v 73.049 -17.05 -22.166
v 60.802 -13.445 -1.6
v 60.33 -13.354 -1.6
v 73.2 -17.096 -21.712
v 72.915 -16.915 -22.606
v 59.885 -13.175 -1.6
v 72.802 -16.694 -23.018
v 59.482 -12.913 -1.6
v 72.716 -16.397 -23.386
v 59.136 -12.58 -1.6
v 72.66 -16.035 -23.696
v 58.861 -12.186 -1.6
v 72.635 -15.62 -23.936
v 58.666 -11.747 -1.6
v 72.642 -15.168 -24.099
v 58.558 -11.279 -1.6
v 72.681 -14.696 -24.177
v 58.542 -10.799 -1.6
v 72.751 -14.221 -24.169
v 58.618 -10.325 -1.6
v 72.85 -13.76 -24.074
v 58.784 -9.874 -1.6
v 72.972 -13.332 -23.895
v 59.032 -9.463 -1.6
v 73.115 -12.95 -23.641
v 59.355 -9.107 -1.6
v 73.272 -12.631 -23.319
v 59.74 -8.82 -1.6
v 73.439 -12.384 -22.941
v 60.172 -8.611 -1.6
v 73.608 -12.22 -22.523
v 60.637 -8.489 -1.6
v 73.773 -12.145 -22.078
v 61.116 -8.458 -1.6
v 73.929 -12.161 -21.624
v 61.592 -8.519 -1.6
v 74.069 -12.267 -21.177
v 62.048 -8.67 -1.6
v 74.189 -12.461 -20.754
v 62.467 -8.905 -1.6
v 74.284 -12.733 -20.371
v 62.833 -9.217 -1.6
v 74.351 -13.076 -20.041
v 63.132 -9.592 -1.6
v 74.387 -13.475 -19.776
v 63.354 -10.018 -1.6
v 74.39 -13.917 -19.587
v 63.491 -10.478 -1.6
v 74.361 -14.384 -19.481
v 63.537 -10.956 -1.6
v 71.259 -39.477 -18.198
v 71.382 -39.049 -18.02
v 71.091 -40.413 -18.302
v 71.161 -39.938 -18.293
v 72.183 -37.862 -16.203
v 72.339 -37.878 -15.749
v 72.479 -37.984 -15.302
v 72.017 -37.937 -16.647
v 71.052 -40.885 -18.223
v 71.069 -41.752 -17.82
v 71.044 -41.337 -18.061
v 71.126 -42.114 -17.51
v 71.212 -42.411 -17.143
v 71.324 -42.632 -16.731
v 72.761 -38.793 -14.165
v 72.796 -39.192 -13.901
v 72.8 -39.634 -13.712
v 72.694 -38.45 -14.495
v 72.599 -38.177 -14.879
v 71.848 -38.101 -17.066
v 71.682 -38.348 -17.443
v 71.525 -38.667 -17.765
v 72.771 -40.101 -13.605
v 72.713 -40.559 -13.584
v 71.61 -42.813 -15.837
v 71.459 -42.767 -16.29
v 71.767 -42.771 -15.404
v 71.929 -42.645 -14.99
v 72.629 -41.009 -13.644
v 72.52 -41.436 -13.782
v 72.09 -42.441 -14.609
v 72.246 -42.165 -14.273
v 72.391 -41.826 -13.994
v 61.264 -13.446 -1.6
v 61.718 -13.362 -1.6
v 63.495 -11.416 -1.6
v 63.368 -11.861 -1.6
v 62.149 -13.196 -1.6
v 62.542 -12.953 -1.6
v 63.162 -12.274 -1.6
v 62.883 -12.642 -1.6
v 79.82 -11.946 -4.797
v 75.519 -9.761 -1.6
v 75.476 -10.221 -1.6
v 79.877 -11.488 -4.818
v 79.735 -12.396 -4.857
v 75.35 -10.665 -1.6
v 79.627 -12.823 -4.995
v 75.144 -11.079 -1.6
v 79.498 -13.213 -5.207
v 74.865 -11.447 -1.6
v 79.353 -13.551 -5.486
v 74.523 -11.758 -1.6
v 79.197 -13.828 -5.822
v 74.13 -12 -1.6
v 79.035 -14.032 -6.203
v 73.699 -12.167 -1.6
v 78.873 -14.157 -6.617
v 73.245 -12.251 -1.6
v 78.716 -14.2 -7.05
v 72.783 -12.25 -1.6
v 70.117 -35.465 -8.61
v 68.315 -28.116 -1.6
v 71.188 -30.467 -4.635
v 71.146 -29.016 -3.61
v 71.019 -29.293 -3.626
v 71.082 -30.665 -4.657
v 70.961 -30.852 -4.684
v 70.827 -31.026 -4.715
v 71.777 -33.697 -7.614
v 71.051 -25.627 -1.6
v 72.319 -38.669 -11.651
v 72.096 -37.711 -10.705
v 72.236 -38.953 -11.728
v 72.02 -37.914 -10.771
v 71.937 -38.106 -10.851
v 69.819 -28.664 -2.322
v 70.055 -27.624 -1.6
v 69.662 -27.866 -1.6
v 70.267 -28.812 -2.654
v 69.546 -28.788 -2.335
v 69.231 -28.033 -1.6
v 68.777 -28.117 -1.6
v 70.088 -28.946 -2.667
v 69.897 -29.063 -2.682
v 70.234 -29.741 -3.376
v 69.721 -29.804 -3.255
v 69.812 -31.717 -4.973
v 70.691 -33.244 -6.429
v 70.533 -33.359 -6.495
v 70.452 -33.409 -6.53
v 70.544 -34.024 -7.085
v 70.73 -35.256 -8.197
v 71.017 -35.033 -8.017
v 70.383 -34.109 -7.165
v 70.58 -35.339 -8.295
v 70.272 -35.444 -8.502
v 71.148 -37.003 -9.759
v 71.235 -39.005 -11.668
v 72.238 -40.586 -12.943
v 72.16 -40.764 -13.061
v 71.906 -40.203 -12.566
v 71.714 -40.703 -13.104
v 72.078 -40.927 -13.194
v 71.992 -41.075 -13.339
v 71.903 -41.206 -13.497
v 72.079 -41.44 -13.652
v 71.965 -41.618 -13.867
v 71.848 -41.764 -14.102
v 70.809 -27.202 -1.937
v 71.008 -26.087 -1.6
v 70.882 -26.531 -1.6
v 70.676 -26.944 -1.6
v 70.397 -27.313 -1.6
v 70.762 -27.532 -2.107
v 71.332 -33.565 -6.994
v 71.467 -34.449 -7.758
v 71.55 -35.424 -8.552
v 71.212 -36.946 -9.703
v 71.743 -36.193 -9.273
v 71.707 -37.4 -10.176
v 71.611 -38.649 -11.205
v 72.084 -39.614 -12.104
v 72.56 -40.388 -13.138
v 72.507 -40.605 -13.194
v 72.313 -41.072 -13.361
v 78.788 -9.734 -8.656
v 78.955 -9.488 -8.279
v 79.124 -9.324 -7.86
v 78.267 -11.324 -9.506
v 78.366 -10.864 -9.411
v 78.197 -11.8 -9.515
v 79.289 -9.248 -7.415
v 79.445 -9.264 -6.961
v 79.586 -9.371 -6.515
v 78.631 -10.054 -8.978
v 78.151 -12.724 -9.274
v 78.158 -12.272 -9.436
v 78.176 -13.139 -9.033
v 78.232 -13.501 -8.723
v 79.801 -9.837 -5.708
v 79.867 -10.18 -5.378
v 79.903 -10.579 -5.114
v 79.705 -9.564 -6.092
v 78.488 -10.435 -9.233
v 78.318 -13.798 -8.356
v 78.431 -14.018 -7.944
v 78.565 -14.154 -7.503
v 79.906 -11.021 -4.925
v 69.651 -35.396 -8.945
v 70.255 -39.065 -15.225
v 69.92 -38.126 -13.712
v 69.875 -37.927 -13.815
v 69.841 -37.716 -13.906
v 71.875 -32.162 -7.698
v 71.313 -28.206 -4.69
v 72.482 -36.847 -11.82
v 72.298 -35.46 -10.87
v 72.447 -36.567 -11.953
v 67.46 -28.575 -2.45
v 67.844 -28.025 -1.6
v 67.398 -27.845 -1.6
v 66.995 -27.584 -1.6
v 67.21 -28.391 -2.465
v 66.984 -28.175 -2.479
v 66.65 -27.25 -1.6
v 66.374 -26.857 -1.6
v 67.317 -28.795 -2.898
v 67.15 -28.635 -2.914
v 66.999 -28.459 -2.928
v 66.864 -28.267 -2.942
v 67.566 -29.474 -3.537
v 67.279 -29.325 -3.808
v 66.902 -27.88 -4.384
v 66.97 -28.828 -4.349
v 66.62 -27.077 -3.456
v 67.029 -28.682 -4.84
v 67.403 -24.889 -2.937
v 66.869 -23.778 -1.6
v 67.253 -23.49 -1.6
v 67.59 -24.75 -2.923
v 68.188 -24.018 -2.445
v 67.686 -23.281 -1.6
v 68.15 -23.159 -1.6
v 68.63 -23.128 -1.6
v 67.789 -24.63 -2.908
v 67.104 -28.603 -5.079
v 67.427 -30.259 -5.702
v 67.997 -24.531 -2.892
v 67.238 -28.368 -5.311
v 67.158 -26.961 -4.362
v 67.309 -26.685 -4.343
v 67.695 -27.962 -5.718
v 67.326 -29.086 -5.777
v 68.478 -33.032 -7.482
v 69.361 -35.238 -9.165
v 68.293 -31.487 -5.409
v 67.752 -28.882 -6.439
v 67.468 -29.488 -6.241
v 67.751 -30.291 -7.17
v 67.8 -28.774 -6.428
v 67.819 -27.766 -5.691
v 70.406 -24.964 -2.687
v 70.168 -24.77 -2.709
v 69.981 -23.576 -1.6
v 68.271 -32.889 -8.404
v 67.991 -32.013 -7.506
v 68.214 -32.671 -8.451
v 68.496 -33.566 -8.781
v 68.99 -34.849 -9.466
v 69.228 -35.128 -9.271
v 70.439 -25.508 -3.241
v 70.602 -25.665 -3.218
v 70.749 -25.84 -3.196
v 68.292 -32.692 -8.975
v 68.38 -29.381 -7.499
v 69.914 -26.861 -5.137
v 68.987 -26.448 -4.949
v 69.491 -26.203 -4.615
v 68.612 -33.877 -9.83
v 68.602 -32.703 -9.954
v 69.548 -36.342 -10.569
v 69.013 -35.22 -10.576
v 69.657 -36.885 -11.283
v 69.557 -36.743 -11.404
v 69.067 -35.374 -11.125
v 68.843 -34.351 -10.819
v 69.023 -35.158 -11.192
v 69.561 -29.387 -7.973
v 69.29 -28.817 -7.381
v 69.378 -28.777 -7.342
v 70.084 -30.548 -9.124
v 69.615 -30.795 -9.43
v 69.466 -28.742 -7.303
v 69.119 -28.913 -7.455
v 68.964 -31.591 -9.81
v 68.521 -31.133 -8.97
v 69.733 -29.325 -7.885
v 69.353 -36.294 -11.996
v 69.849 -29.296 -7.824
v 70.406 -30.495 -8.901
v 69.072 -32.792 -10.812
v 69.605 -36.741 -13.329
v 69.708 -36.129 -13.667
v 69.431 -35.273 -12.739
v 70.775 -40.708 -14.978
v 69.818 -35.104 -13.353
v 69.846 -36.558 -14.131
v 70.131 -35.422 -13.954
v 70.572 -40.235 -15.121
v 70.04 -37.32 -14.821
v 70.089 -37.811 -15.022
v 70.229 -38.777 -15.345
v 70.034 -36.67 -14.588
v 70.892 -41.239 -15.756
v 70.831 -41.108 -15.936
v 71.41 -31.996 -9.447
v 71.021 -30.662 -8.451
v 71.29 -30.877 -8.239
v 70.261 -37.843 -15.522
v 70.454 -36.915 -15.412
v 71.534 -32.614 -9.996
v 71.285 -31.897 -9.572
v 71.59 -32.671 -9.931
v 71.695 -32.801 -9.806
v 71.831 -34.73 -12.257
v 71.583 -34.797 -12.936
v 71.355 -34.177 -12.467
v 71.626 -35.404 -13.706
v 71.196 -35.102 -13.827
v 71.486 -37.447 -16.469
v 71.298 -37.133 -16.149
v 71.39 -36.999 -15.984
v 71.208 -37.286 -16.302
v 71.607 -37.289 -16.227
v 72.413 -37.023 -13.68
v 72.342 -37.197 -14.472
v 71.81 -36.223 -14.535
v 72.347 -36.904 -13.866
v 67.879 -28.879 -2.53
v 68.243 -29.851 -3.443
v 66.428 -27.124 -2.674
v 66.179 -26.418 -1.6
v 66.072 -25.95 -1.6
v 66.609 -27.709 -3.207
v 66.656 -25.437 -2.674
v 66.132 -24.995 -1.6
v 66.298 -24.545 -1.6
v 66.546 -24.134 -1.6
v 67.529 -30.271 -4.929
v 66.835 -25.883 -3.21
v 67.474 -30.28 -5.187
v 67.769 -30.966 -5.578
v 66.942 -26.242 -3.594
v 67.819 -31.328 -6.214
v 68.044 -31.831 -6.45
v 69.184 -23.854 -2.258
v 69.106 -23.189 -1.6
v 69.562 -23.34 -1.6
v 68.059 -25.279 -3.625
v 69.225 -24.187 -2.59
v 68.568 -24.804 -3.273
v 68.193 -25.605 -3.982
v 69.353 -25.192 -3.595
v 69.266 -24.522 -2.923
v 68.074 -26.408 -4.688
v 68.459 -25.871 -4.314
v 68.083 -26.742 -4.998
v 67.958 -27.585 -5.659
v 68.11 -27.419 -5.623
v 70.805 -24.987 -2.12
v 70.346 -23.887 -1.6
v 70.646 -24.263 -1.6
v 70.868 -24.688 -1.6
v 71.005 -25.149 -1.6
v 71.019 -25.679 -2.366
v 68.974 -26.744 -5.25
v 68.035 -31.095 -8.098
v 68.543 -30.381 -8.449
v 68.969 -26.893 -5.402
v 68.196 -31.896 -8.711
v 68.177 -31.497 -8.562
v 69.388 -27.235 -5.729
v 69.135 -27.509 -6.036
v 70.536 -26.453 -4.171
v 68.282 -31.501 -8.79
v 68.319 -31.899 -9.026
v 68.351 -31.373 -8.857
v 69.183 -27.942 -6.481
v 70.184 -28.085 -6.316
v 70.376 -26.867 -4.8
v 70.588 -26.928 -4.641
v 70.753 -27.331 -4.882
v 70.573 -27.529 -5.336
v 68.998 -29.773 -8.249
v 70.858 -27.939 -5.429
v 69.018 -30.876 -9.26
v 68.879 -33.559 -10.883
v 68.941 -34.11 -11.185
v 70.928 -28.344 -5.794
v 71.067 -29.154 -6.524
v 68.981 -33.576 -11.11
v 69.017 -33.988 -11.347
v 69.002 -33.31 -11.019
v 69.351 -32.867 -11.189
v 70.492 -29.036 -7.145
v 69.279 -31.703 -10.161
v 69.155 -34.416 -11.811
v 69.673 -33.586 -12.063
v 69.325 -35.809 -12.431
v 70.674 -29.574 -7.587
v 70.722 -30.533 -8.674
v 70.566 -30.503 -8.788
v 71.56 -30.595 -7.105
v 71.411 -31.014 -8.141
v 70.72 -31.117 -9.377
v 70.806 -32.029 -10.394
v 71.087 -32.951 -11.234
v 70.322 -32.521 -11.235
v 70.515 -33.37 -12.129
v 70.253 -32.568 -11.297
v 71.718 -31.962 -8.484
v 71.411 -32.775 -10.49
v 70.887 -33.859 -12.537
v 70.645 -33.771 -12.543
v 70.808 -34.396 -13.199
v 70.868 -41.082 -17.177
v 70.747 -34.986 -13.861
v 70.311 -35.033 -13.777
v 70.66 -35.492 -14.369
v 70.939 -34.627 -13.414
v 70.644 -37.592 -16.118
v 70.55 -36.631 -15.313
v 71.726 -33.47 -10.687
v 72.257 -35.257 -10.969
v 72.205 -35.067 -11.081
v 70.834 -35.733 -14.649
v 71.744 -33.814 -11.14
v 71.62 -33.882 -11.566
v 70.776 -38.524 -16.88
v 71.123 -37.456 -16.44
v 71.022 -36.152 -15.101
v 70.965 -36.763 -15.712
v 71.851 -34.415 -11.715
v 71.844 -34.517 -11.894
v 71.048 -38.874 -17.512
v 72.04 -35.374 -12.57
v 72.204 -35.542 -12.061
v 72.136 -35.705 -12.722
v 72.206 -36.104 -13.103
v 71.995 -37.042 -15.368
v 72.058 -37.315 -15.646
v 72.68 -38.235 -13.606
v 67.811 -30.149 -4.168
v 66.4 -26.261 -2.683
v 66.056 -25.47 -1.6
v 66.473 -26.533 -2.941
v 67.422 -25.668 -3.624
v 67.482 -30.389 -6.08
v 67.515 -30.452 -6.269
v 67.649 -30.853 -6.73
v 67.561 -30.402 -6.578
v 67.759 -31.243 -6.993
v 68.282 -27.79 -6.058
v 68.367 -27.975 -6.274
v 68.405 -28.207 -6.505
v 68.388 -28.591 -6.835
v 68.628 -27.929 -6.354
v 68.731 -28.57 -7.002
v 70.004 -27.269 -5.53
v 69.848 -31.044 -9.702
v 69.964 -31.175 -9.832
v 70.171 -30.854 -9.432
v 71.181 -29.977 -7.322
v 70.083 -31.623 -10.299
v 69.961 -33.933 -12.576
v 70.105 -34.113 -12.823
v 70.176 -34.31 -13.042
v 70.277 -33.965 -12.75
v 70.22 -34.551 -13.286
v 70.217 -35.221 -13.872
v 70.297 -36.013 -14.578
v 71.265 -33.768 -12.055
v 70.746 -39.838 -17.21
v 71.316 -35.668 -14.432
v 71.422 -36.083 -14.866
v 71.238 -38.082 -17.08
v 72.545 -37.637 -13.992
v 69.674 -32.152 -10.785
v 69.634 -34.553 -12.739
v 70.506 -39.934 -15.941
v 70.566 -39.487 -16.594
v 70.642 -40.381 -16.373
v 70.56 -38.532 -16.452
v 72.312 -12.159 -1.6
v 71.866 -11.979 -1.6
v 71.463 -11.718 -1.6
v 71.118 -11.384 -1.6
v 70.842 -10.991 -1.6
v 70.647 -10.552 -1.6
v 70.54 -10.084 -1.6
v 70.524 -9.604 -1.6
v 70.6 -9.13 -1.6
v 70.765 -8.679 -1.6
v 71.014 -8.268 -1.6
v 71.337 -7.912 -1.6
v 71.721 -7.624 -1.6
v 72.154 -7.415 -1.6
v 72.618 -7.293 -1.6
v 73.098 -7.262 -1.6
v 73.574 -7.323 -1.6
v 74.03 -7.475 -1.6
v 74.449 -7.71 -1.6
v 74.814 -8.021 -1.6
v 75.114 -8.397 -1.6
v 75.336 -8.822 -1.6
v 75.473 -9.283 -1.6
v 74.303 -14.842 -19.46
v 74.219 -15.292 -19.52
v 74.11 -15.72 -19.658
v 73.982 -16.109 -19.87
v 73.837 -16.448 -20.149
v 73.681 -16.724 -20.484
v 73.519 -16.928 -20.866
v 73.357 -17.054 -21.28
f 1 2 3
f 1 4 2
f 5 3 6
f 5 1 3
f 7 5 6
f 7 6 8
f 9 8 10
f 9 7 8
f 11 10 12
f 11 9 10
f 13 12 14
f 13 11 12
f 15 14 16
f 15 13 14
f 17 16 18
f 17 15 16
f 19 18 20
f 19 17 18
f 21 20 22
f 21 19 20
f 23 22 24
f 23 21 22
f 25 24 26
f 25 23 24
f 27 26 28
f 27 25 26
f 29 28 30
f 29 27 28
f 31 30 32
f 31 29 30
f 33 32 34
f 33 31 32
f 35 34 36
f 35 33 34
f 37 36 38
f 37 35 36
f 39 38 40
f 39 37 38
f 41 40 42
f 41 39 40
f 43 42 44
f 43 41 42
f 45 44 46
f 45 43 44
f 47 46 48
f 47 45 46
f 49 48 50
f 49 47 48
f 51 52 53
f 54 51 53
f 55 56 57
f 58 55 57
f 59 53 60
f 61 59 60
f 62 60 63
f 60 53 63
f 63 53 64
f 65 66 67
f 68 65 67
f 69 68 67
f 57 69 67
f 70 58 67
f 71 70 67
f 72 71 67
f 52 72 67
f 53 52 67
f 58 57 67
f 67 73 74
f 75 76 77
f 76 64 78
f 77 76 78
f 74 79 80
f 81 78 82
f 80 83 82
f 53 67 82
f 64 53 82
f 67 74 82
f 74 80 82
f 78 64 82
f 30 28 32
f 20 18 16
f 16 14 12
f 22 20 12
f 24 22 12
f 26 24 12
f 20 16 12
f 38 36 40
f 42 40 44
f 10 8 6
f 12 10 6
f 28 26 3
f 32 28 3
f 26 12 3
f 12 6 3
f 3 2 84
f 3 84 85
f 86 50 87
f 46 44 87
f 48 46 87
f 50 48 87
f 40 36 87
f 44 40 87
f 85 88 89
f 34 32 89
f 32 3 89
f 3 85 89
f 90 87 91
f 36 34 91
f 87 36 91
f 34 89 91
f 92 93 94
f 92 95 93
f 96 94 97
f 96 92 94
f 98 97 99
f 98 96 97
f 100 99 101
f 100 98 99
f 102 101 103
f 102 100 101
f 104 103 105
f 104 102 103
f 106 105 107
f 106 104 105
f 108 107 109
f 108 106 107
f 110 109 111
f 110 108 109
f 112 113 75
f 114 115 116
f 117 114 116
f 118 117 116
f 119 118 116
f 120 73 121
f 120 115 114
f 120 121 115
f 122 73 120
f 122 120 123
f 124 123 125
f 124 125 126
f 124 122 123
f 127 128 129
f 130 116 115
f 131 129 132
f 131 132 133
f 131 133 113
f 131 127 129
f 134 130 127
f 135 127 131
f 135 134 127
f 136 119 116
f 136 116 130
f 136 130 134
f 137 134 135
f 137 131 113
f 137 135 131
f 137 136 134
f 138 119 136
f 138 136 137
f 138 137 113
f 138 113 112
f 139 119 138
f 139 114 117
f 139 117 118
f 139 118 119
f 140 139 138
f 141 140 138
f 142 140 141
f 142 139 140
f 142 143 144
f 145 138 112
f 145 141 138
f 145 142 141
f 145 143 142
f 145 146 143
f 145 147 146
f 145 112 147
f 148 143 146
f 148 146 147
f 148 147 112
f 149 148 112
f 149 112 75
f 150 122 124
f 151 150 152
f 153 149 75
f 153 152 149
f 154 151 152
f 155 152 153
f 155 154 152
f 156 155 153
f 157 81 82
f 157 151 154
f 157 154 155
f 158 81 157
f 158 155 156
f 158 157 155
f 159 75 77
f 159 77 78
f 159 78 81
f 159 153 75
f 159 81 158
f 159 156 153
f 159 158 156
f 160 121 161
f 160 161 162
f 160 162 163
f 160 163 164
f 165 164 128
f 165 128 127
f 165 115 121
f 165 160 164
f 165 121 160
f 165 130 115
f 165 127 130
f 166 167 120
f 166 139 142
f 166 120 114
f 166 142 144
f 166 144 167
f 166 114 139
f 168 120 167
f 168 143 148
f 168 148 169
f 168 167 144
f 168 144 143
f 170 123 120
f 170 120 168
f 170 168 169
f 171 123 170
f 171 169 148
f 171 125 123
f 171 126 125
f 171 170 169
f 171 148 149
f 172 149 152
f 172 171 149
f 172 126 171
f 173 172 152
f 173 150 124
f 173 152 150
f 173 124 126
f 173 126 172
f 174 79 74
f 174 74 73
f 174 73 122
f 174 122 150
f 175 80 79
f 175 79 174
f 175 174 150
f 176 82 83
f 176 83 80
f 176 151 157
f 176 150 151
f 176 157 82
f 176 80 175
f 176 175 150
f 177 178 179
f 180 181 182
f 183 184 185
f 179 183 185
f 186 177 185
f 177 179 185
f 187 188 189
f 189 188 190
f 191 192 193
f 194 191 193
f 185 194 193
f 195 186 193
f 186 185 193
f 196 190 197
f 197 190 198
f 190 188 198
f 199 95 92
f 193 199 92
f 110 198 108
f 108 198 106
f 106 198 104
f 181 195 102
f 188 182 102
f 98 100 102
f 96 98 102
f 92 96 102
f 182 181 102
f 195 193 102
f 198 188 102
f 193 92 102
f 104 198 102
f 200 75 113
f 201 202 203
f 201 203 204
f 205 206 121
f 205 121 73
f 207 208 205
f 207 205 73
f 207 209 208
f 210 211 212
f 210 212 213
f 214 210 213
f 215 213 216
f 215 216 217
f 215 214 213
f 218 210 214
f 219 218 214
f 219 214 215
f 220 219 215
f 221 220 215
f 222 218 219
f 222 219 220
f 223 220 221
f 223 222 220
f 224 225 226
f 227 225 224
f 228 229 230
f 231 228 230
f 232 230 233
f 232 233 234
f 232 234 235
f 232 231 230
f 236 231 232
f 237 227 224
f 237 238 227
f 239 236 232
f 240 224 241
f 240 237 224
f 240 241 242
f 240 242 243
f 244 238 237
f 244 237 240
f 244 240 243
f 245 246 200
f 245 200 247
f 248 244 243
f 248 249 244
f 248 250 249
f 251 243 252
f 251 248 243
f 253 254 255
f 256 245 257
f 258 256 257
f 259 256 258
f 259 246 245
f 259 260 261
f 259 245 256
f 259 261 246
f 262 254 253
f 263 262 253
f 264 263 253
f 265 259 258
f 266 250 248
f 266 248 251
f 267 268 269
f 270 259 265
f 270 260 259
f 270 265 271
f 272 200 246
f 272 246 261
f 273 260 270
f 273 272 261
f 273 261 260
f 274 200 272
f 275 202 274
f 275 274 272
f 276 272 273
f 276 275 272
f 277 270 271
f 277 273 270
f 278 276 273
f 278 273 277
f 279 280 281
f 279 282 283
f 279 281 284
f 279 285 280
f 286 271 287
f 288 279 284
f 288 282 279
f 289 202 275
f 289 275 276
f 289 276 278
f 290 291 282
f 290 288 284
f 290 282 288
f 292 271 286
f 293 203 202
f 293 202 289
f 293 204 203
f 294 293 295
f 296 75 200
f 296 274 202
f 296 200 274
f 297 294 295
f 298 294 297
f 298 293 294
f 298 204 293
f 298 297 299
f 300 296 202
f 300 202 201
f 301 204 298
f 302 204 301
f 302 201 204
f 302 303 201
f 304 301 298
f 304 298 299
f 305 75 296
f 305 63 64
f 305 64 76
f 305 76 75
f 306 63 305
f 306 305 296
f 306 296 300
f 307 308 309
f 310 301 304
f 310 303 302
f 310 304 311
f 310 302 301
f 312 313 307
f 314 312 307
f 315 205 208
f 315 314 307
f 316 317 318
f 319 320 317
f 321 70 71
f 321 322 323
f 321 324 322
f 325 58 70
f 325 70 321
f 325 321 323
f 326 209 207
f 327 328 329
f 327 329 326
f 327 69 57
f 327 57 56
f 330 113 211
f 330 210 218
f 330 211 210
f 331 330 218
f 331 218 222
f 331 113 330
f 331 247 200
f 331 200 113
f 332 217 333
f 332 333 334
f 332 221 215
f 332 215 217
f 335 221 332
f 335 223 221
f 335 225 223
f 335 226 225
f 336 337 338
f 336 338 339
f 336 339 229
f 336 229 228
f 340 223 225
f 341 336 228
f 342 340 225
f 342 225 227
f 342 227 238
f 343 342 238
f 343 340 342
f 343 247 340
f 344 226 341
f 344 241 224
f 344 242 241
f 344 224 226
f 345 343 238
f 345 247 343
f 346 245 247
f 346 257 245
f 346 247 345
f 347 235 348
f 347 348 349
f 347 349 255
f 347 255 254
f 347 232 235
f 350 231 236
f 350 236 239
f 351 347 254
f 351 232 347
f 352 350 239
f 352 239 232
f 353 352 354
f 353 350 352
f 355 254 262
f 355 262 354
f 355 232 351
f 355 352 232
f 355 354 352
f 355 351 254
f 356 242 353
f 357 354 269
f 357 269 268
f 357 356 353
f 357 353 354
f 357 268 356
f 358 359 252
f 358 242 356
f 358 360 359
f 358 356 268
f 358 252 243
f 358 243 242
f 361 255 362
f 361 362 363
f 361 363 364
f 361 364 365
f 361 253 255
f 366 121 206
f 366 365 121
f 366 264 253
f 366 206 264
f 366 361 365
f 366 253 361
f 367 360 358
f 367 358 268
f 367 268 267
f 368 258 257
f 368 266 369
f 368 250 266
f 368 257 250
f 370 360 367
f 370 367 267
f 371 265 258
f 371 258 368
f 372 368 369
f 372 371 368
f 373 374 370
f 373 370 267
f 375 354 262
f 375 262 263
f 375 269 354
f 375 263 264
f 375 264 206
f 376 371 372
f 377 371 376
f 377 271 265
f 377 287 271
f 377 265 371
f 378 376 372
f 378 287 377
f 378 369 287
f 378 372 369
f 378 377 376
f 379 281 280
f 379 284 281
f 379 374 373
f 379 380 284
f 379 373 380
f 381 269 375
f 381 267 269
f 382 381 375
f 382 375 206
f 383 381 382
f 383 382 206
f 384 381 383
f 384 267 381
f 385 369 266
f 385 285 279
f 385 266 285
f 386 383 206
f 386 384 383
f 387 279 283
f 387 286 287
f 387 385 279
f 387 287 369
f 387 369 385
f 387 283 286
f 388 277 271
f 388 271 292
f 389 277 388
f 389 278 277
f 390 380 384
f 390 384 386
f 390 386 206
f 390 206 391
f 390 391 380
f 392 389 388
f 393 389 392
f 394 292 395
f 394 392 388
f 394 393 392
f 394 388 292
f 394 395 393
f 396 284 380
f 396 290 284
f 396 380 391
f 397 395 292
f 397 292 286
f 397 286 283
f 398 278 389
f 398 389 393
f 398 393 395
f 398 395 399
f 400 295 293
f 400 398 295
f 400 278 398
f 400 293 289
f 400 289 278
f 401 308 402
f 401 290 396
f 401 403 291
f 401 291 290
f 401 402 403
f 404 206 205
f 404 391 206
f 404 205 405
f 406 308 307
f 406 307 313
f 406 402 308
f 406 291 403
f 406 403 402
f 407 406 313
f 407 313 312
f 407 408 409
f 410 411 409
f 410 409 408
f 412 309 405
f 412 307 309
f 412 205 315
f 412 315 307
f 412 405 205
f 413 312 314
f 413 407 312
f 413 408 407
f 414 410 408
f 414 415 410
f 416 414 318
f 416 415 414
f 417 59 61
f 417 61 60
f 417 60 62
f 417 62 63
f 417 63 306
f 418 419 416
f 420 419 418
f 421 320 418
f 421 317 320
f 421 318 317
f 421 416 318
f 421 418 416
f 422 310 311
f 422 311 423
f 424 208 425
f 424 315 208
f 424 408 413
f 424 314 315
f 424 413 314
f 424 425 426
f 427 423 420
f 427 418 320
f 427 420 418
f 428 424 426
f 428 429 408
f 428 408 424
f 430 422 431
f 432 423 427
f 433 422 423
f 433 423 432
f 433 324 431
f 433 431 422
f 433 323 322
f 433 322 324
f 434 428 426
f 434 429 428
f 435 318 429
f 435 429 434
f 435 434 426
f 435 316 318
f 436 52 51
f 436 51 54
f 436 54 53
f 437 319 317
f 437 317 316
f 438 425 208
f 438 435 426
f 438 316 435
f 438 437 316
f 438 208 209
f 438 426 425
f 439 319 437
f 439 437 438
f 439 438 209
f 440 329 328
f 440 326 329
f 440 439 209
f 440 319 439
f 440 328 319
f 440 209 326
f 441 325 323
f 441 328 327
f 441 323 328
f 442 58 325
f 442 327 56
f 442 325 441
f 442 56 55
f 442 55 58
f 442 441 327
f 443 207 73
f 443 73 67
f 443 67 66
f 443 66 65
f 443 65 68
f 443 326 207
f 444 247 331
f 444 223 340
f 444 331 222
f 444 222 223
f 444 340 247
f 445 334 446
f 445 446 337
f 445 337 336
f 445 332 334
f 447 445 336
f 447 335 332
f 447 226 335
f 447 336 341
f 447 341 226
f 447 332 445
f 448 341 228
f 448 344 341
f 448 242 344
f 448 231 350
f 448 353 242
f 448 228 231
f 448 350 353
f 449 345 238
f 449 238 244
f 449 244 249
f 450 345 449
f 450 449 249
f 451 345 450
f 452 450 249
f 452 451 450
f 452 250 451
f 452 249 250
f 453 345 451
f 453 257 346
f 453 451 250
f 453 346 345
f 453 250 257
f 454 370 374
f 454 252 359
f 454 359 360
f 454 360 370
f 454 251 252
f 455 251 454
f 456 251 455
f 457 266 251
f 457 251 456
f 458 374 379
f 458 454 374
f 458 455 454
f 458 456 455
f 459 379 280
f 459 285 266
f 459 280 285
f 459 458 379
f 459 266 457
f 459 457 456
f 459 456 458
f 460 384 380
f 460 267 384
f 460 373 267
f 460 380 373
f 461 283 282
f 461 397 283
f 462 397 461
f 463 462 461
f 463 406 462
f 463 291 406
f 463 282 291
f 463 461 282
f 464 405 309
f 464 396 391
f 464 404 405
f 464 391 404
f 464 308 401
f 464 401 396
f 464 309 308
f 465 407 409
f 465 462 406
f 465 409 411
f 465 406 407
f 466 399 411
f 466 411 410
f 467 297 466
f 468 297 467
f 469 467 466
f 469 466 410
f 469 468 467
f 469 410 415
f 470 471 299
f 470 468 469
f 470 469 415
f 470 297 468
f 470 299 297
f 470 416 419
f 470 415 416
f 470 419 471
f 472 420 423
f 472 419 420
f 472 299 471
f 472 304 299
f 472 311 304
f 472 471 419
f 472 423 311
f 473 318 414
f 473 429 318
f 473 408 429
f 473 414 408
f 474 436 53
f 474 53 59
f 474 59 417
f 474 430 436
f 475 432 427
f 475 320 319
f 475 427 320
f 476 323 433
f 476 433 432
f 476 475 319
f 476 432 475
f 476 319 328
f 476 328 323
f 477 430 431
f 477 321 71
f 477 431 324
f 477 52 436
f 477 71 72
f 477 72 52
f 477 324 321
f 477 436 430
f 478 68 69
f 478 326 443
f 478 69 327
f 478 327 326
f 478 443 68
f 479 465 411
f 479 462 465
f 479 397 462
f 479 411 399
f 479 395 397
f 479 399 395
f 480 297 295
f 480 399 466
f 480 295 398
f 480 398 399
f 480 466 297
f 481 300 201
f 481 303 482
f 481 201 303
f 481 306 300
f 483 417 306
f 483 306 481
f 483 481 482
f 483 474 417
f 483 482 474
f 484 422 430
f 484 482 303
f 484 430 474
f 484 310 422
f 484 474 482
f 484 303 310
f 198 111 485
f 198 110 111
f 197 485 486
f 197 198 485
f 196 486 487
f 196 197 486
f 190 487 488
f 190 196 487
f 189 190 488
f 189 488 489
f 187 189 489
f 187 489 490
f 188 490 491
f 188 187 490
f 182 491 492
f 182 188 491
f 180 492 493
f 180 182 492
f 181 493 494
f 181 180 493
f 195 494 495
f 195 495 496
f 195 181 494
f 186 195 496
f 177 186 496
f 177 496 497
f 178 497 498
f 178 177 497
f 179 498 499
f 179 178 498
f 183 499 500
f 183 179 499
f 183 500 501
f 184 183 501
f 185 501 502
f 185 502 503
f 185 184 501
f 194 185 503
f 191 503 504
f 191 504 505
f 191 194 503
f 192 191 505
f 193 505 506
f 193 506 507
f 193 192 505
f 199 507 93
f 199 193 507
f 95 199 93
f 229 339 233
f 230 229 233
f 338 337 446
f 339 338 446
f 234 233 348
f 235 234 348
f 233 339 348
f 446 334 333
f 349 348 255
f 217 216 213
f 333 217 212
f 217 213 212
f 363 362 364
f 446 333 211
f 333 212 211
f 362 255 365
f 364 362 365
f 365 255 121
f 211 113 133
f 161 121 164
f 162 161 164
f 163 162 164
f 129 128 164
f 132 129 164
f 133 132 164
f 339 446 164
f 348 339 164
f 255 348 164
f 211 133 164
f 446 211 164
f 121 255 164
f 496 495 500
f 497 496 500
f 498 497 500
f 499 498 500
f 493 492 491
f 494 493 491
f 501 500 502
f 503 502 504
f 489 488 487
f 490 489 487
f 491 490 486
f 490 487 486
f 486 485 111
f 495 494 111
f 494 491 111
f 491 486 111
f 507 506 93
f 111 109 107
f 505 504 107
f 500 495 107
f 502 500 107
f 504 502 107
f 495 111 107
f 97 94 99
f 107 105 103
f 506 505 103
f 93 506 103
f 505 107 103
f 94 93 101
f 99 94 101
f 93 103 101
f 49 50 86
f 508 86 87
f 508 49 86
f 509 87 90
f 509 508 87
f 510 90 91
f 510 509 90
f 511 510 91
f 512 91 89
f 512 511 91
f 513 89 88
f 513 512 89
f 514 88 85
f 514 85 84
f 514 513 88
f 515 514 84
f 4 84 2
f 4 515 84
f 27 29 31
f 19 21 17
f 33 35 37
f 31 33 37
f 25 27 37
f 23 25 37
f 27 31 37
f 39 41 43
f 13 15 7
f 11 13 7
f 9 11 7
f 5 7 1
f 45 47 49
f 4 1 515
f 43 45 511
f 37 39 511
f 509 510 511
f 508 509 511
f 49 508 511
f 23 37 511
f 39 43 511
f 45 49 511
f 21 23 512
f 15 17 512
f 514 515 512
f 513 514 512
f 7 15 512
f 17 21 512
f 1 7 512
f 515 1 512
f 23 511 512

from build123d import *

# Parameters (mm, degrees)
SKETCH075_R = 2.5
SKETCH076_R = 2.5
SKETCH068_R = 2.5
SKETCH069_R = 2.5
SKETCH066_R = 2.5
SKETCH067_R = 2.5


with BuildPart() as part:
    # Sketch075 (on Face1 of Binder010) → AdditiveLoft006 section 0
    with BuildSketch(Plane(origin=(0, 0, -1.6), x_dir=(1, 0, 0), z_dir=(0, 0, -1))):
        with Locations((61.037277, 10.956422)):
            Circle(SKETCH075_R)
    # Sketch076 (on Face1 of Binder011) → AdditiveLoft006 section 1
    with BuildSketch(Plane(origin=(72.882287, -10.305781, -25.382453), x_dir=(-0.124998, -0.991201, 0.043533), z_dir=(-0.936059, 0.132362, 0.325998))):
        with Locations((4.35043, 3.570742)):
            Circle(SKETCH076_R)
    loft()

    # Sketch068 (on Face1 of Binder010) → AdditiveLoft007 section 0
    with BuildSketch(Plane(origin=(0, 0, -1.6), x_dir=(1, 0, 0), z_dir=(0, 0, -1))):
        with Locations((68.551048, 25.626923)):
            Circle(SKETCH068_R)
    # Sketch069 (on Face1 of Binder011) → AdditiveLoft007 section 1
    with BuildSketch(Plane(origin=(72.882287, -10.305781, -25.382453), x_dir=(-0.124998, -0.991201, 0.043533), z_dir=(-0.936059, 0.132362, 0.325998))):
        with Locations((30.295708, 8.596345)):
            Circle(SKETCH069_R)
    loft()

    # Sketch066 (on Face1 of Binder010) → AdditiveLoft008 section 0
    with BuildSketch(Plane(origin=(0, 0, -1.6), x_dir=(1, 0, 0), z_dir=(0, 0, -1))):
        with Locations((73.018967, 9.761001)):
            Circle(SKETCH066_R)
    # Sketch067 (on Face1 of Binder011) → AdditiveLoft008 section 1
    with BuildSketch(Plane(origin=(72.882287, -10.305781, -25.382453), x_dir=(-0.124998, -0.991201, 0.043533), z_dir=(-0.936059, 0.132362, 0.325998))):
        with Locations((1.428355, 19.231849)):
            Circle(SKETCH067_R)
    loft()


solid = part.part
